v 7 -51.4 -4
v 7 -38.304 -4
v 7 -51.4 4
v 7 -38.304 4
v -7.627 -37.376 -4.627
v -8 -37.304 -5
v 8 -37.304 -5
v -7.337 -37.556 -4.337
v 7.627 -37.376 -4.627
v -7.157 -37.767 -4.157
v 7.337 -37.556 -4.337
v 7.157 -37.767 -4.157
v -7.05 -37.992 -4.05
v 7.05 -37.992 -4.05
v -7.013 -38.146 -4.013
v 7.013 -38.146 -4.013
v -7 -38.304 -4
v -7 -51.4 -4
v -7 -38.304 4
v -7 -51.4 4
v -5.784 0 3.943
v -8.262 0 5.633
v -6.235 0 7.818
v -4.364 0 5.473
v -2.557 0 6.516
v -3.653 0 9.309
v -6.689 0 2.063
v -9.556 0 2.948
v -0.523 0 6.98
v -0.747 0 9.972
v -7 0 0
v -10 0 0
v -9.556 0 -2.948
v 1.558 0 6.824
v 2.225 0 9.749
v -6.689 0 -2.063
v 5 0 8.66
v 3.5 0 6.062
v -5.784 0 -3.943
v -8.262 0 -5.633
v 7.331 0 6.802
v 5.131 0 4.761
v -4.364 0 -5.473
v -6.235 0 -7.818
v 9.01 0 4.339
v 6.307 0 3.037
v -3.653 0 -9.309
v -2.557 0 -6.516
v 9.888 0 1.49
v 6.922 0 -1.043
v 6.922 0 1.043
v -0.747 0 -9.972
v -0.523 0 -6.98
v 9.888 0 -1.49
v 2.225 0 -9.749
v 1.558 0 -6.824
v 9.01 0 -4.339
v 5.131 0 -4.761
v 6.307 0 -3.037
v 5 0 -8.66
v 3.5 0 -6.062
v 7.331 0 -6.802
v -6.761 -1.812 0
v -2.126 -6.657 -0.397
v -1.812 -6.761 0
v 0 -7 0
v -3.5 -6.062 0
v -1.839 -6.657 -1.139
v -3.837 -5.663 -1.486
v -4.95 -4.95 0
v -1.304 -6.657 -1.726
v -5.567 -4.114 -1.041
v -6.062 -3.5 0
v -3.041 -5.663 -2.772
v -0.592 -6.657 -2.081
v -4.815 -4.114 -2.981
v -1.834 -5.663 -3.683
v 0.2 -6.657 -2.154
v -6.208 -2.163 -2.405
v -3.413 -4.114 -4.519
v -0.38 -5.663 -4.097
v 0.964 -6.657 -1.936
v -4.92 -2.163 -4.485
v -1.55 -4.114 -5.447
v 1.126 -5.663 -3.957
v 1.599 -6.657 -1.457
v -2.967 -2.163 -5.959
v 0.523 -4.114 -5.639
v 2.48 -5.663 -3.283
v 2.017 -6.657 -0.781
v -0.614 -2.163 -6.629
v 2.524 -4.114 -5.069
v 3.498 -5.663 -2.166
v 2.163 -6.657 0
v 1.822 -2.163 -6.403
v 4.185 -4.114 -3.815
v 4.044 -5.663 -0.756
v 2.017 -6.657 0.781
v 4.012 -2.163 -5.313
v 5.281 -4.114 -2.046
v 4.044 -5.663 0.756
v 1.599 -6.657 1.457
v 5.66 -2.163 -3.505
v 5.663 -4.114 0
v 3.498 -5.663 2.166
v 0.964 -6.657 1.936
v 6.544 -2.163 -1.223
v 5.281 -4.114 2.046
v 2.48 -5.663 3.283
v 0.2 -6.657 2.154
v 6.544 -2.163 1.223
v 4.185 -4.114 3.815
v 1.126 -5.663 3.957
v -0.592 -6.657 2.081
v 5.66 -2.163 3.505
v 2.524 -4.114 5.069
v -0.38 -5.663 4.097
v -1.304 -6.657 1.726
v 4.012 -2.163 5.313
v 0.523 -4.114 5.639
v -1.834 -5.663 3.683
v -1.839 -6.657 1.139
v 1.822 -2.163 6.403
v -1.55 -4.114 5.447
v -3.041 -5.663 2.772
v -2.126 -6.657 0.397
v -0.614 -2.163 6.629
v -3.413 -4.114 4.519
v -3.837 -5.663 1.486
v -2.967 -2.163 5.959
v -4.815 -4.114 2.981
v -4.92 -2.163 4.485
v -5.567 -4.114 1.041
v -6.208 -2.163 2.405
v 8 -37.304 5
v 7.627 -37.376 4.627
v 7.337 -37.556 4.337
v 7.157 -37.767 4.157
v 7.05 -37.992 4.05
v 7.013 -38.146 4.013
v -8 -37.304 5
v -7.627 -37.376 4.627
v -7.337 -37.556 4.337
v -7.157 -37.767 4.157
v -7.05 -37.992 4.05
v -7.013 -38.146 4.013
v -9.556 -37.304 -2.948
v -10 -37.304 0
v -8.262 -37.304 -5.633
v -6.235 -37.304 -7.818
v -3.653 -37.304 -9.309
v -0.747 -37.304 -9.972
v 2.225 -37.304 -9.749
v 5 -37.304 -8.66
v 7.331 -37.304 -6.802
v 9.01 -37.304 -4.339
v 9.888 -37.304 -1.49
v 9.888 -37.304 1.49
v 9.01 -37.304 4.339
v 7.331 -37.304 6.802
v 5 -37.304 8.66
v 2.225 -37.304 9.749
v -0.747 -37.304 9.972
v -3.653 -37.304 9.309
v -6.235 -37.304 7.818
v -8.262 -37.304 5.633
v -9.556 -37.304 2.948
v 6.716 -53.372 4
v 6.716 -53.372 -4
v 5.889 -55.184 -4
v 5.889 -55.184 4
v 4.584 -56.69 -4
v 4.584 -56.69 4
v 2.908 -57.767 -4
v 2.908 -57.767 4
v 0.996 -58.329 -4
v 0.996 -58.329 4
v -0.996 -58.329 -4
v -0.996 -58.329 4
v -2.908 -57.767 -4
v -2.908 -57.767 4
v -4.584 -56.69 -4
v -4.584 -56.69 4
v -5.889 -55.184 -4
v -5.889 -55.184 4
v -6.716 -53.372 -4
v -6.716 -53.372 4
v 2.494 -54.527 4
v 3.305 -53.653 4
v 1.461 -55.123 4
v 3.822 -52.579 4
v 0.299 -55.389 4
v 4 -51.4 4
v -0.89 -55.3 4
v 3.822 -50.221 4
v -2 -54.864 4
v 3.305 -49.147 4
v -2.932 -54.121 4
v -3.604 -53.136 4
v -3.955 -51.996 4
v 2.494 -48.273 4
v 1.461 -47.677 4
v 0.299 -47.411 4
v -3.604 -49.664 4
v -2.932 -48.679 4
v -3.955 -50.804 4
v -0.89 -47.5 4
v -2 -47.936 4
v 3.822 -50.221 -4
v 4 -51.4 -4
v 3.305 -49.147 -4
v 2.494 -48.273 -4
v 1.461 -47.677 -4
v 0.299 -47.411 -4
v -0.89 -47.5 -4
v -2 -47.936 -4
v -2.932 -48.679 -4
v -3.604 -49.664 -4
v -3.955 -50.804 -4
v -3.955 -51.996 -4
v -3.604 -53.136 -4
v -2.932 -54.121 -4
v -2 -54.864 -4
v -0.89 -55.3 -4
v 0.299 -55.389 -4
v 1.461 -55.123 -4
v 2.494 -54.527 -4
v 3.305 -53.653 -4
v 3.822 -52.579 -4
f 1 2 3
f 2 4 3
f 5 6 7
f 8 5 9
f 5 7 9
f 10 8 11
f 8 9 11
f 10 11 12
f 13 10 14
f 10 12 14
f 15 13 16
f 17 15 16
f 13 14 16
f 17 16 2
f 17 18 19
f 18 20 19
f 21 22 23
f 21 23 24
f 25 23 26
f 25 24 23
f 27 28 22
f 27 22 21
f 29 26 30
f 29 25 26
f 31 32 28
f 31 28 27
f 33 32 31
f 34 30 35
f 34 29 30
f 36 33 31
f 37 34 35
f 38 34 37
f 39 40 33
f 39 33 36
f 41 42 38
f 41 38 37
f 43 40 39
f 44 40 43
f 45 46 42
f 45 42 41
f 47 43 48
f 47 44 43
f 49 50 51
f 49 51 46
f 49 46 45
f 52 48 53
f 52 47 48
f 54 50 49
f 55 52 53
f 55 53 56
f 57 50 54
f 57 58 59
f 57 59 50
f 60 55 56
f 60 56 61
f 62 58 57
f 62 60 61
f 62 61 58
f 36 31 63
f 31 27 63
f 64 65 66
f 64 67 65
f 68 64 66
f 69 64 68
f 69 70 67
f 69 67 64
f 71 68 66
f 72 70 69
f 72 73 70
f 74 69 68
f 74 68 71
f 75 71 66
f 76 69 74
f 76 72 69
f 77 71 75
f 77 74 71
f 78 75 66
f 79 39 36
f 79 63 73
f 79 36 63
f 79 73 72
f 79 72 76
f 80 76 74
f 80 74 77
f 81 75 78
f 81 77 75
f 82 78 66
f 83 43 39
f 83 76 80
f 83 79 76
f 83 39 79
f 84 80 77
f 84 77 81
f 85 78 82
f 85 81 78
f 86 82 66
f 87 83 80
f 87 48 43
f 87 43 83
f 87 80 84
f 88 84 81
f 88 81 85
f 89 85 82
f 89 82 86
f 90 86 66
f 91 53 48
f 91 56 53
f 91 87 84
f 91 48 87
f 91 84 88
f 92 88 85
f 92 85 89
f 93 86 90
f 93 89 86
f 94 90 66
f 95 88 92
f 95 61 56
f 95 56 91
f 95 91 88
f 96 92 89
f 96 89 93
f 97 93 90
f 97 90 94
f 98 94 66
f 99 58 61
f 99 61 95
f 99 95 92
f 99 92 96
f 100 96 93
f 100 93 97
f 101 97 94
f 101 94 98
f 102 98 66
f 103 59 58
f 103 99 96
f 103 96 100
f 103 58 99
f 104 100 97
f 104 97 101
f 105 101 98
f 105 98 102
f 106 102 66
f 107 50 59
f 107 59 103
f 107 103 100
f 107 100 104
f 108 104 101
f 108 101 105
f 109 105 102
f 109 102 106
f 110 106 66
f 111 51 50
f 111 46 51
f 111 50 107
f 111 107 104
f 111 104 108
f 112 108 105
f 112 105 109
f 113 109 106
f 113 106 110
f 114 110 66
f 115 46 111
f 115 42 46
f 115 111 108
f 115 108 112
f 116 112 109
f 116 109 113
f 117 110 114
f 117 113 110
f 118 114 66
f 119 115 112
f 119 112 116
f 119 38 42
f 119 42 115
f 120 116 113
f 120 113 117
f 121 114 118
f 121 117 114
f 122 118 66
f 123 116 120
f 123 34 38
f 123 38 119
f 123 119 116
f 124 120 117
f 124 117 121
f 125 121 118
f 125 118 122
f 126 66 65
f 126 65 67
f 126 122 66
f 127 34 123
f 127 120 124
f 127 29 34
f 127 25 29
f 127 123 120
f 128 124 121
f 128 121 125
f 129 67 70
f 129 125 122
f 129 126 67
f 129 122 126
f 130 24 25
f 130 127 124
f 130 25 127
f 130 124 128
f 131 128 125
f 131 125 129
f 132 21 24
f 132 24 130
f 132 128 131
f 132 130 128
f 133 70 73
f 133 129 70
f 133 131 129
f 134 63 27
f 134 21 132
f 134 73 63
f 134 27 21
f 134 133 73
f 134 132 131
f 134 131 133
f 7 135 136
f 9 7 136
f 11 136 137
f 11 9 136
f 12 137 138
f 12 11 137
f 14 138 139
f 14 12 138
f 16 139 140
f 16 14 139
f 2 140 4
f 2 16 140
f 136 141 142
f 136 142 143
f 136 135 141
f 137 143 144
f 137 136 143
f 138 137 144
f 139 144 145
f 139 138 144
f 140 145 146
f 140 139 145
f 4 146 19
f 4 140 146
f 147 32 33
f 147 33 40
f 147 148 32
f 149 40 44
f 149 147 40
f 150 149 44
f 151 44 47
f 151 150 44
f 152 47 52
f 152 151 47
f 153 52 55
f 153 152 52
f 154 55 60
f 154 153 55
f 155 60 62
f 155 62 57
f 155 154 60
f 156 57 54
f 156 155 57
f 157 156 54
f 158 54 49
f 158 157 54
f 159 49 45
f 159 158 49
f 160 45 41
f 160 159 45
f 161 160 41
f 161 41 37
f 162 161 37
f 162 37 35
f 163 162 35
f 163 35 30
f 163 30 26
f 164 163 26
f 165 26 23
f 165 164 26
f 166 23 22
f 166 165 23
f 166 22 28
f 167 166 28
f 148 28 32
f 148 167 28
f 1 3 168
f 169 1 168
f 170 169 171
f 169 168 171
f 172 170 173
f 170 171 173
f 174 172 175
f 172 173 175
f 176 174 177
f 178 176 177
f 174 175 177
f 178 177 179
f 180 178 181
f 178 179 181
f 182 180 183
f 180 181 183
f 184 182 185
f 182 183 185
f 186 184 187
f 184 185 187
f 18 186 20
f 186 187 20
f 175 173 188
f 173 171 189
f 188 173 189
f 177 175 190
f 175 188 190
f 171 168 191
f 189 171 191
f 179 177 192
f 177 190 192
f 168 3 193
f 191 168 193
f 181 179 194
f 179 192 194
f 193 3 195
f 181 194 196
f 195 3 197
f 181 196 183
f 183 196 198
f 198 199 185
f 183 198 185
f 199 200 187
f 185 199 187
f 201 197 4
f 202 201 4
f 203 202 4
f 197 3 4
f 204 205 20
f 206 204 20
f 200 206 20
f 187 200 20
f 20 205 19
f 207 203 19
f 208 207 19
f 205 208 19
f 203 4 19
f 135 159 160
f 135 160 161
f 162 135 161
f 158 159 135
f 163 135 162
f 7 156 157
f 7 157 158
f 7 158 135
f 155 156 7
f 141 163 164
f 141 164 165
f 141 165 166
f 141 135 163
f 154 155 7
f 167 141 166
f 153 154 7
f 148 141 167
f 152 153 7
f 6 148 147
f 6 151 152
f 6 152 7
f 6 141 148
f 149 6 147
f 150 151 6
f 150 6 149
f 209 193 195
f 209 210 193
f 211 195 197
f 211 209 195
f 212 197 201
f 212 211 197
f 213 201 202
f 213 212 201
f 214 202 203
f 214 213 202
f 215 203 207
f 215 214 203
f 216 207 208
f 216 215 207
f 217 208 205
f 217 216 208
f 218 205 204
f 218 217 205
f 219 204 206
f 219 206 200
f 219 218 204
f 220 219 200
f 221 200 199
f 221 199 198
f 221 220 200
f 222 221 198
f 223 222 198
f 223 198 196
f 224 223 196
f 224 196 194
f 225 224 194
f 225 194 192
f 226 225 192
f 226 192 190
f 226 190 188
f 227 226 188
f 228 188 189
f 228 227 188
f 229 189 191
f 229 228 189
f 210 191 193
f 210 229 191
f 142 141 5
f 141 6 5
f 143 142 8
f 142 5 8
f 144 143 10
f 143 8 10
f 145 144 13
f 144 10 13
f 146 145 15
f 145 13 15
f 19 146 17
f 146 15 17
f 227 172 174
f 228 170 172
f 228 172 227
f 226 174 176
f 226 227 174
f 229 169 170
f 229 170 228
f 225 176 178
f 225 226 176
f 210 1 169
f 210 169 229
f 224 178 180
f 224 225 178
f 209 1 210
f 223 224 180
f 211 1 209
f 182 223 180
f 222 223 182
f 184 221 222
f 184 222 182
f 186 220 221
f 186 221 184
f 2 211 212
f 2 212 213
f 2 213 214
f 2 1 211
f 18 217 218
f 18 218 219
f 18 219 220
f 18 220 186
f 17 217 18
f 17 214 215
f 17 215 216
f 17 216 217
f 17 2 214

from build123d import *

# Parameters (mm, degrees)
SKETCH2_R           = 4
BOSS_EXTRUDE1_DEPTH = 4
FILLET1_R           = 1


with BuildPart() as part:
    # Sketch1 → Revolve1 (revolve)
    with BuildSketch(Plane.XY):
        with BuildLine():
            ThreePointArc((0, -7), (-4.949747468, -4.949747468), (-7, 0))
            Line((-7, 0), (-10, 0))
            Line((-10, 0), (-10, -37.303915827))
            Line((-10, -37.303915827), (0, -37.303915827))
            Line((0, -37.303915827), (0, -7))
        make_face()
    revolve(axis=Axis((0, 4.024665624, 0), (0, -1, 0)))

    # Sketch2 → Boss-Extrude1 (add, symmetric)
    with BuildSketch(Plane.XY):
        with BuildLine():
            Line((-7, -51.4), (-7, -37.303915827))
            Line((-7, -37.303915827), (7, -37.303915827))
            Line((7, -37.303915827), (7, -51.4))
            ThreePointArc((7, -51.4), (0, -58.4), (-7, -51.4))
        make_face()
        with Locations((0, -51.4)):
            Circle(SKETCH2_R, mode=Mode.SUBTRACT)
    extrude(amount=BOSS_EXTRUDE1_DEPTH, both=True)

    # Fillet1
    fillet1_edges = [part.edges().sort_by_distance(p)[0] for p in [
        (0, -37.303915827, 4),
        (0, -37.303915827, -4),
        (7, -37.303915827, 0),
        (-7, -37.303915827, 0),
    ]]
    fillet(fillet1_edges, radius=FILLET1_R)


solid = part.part
